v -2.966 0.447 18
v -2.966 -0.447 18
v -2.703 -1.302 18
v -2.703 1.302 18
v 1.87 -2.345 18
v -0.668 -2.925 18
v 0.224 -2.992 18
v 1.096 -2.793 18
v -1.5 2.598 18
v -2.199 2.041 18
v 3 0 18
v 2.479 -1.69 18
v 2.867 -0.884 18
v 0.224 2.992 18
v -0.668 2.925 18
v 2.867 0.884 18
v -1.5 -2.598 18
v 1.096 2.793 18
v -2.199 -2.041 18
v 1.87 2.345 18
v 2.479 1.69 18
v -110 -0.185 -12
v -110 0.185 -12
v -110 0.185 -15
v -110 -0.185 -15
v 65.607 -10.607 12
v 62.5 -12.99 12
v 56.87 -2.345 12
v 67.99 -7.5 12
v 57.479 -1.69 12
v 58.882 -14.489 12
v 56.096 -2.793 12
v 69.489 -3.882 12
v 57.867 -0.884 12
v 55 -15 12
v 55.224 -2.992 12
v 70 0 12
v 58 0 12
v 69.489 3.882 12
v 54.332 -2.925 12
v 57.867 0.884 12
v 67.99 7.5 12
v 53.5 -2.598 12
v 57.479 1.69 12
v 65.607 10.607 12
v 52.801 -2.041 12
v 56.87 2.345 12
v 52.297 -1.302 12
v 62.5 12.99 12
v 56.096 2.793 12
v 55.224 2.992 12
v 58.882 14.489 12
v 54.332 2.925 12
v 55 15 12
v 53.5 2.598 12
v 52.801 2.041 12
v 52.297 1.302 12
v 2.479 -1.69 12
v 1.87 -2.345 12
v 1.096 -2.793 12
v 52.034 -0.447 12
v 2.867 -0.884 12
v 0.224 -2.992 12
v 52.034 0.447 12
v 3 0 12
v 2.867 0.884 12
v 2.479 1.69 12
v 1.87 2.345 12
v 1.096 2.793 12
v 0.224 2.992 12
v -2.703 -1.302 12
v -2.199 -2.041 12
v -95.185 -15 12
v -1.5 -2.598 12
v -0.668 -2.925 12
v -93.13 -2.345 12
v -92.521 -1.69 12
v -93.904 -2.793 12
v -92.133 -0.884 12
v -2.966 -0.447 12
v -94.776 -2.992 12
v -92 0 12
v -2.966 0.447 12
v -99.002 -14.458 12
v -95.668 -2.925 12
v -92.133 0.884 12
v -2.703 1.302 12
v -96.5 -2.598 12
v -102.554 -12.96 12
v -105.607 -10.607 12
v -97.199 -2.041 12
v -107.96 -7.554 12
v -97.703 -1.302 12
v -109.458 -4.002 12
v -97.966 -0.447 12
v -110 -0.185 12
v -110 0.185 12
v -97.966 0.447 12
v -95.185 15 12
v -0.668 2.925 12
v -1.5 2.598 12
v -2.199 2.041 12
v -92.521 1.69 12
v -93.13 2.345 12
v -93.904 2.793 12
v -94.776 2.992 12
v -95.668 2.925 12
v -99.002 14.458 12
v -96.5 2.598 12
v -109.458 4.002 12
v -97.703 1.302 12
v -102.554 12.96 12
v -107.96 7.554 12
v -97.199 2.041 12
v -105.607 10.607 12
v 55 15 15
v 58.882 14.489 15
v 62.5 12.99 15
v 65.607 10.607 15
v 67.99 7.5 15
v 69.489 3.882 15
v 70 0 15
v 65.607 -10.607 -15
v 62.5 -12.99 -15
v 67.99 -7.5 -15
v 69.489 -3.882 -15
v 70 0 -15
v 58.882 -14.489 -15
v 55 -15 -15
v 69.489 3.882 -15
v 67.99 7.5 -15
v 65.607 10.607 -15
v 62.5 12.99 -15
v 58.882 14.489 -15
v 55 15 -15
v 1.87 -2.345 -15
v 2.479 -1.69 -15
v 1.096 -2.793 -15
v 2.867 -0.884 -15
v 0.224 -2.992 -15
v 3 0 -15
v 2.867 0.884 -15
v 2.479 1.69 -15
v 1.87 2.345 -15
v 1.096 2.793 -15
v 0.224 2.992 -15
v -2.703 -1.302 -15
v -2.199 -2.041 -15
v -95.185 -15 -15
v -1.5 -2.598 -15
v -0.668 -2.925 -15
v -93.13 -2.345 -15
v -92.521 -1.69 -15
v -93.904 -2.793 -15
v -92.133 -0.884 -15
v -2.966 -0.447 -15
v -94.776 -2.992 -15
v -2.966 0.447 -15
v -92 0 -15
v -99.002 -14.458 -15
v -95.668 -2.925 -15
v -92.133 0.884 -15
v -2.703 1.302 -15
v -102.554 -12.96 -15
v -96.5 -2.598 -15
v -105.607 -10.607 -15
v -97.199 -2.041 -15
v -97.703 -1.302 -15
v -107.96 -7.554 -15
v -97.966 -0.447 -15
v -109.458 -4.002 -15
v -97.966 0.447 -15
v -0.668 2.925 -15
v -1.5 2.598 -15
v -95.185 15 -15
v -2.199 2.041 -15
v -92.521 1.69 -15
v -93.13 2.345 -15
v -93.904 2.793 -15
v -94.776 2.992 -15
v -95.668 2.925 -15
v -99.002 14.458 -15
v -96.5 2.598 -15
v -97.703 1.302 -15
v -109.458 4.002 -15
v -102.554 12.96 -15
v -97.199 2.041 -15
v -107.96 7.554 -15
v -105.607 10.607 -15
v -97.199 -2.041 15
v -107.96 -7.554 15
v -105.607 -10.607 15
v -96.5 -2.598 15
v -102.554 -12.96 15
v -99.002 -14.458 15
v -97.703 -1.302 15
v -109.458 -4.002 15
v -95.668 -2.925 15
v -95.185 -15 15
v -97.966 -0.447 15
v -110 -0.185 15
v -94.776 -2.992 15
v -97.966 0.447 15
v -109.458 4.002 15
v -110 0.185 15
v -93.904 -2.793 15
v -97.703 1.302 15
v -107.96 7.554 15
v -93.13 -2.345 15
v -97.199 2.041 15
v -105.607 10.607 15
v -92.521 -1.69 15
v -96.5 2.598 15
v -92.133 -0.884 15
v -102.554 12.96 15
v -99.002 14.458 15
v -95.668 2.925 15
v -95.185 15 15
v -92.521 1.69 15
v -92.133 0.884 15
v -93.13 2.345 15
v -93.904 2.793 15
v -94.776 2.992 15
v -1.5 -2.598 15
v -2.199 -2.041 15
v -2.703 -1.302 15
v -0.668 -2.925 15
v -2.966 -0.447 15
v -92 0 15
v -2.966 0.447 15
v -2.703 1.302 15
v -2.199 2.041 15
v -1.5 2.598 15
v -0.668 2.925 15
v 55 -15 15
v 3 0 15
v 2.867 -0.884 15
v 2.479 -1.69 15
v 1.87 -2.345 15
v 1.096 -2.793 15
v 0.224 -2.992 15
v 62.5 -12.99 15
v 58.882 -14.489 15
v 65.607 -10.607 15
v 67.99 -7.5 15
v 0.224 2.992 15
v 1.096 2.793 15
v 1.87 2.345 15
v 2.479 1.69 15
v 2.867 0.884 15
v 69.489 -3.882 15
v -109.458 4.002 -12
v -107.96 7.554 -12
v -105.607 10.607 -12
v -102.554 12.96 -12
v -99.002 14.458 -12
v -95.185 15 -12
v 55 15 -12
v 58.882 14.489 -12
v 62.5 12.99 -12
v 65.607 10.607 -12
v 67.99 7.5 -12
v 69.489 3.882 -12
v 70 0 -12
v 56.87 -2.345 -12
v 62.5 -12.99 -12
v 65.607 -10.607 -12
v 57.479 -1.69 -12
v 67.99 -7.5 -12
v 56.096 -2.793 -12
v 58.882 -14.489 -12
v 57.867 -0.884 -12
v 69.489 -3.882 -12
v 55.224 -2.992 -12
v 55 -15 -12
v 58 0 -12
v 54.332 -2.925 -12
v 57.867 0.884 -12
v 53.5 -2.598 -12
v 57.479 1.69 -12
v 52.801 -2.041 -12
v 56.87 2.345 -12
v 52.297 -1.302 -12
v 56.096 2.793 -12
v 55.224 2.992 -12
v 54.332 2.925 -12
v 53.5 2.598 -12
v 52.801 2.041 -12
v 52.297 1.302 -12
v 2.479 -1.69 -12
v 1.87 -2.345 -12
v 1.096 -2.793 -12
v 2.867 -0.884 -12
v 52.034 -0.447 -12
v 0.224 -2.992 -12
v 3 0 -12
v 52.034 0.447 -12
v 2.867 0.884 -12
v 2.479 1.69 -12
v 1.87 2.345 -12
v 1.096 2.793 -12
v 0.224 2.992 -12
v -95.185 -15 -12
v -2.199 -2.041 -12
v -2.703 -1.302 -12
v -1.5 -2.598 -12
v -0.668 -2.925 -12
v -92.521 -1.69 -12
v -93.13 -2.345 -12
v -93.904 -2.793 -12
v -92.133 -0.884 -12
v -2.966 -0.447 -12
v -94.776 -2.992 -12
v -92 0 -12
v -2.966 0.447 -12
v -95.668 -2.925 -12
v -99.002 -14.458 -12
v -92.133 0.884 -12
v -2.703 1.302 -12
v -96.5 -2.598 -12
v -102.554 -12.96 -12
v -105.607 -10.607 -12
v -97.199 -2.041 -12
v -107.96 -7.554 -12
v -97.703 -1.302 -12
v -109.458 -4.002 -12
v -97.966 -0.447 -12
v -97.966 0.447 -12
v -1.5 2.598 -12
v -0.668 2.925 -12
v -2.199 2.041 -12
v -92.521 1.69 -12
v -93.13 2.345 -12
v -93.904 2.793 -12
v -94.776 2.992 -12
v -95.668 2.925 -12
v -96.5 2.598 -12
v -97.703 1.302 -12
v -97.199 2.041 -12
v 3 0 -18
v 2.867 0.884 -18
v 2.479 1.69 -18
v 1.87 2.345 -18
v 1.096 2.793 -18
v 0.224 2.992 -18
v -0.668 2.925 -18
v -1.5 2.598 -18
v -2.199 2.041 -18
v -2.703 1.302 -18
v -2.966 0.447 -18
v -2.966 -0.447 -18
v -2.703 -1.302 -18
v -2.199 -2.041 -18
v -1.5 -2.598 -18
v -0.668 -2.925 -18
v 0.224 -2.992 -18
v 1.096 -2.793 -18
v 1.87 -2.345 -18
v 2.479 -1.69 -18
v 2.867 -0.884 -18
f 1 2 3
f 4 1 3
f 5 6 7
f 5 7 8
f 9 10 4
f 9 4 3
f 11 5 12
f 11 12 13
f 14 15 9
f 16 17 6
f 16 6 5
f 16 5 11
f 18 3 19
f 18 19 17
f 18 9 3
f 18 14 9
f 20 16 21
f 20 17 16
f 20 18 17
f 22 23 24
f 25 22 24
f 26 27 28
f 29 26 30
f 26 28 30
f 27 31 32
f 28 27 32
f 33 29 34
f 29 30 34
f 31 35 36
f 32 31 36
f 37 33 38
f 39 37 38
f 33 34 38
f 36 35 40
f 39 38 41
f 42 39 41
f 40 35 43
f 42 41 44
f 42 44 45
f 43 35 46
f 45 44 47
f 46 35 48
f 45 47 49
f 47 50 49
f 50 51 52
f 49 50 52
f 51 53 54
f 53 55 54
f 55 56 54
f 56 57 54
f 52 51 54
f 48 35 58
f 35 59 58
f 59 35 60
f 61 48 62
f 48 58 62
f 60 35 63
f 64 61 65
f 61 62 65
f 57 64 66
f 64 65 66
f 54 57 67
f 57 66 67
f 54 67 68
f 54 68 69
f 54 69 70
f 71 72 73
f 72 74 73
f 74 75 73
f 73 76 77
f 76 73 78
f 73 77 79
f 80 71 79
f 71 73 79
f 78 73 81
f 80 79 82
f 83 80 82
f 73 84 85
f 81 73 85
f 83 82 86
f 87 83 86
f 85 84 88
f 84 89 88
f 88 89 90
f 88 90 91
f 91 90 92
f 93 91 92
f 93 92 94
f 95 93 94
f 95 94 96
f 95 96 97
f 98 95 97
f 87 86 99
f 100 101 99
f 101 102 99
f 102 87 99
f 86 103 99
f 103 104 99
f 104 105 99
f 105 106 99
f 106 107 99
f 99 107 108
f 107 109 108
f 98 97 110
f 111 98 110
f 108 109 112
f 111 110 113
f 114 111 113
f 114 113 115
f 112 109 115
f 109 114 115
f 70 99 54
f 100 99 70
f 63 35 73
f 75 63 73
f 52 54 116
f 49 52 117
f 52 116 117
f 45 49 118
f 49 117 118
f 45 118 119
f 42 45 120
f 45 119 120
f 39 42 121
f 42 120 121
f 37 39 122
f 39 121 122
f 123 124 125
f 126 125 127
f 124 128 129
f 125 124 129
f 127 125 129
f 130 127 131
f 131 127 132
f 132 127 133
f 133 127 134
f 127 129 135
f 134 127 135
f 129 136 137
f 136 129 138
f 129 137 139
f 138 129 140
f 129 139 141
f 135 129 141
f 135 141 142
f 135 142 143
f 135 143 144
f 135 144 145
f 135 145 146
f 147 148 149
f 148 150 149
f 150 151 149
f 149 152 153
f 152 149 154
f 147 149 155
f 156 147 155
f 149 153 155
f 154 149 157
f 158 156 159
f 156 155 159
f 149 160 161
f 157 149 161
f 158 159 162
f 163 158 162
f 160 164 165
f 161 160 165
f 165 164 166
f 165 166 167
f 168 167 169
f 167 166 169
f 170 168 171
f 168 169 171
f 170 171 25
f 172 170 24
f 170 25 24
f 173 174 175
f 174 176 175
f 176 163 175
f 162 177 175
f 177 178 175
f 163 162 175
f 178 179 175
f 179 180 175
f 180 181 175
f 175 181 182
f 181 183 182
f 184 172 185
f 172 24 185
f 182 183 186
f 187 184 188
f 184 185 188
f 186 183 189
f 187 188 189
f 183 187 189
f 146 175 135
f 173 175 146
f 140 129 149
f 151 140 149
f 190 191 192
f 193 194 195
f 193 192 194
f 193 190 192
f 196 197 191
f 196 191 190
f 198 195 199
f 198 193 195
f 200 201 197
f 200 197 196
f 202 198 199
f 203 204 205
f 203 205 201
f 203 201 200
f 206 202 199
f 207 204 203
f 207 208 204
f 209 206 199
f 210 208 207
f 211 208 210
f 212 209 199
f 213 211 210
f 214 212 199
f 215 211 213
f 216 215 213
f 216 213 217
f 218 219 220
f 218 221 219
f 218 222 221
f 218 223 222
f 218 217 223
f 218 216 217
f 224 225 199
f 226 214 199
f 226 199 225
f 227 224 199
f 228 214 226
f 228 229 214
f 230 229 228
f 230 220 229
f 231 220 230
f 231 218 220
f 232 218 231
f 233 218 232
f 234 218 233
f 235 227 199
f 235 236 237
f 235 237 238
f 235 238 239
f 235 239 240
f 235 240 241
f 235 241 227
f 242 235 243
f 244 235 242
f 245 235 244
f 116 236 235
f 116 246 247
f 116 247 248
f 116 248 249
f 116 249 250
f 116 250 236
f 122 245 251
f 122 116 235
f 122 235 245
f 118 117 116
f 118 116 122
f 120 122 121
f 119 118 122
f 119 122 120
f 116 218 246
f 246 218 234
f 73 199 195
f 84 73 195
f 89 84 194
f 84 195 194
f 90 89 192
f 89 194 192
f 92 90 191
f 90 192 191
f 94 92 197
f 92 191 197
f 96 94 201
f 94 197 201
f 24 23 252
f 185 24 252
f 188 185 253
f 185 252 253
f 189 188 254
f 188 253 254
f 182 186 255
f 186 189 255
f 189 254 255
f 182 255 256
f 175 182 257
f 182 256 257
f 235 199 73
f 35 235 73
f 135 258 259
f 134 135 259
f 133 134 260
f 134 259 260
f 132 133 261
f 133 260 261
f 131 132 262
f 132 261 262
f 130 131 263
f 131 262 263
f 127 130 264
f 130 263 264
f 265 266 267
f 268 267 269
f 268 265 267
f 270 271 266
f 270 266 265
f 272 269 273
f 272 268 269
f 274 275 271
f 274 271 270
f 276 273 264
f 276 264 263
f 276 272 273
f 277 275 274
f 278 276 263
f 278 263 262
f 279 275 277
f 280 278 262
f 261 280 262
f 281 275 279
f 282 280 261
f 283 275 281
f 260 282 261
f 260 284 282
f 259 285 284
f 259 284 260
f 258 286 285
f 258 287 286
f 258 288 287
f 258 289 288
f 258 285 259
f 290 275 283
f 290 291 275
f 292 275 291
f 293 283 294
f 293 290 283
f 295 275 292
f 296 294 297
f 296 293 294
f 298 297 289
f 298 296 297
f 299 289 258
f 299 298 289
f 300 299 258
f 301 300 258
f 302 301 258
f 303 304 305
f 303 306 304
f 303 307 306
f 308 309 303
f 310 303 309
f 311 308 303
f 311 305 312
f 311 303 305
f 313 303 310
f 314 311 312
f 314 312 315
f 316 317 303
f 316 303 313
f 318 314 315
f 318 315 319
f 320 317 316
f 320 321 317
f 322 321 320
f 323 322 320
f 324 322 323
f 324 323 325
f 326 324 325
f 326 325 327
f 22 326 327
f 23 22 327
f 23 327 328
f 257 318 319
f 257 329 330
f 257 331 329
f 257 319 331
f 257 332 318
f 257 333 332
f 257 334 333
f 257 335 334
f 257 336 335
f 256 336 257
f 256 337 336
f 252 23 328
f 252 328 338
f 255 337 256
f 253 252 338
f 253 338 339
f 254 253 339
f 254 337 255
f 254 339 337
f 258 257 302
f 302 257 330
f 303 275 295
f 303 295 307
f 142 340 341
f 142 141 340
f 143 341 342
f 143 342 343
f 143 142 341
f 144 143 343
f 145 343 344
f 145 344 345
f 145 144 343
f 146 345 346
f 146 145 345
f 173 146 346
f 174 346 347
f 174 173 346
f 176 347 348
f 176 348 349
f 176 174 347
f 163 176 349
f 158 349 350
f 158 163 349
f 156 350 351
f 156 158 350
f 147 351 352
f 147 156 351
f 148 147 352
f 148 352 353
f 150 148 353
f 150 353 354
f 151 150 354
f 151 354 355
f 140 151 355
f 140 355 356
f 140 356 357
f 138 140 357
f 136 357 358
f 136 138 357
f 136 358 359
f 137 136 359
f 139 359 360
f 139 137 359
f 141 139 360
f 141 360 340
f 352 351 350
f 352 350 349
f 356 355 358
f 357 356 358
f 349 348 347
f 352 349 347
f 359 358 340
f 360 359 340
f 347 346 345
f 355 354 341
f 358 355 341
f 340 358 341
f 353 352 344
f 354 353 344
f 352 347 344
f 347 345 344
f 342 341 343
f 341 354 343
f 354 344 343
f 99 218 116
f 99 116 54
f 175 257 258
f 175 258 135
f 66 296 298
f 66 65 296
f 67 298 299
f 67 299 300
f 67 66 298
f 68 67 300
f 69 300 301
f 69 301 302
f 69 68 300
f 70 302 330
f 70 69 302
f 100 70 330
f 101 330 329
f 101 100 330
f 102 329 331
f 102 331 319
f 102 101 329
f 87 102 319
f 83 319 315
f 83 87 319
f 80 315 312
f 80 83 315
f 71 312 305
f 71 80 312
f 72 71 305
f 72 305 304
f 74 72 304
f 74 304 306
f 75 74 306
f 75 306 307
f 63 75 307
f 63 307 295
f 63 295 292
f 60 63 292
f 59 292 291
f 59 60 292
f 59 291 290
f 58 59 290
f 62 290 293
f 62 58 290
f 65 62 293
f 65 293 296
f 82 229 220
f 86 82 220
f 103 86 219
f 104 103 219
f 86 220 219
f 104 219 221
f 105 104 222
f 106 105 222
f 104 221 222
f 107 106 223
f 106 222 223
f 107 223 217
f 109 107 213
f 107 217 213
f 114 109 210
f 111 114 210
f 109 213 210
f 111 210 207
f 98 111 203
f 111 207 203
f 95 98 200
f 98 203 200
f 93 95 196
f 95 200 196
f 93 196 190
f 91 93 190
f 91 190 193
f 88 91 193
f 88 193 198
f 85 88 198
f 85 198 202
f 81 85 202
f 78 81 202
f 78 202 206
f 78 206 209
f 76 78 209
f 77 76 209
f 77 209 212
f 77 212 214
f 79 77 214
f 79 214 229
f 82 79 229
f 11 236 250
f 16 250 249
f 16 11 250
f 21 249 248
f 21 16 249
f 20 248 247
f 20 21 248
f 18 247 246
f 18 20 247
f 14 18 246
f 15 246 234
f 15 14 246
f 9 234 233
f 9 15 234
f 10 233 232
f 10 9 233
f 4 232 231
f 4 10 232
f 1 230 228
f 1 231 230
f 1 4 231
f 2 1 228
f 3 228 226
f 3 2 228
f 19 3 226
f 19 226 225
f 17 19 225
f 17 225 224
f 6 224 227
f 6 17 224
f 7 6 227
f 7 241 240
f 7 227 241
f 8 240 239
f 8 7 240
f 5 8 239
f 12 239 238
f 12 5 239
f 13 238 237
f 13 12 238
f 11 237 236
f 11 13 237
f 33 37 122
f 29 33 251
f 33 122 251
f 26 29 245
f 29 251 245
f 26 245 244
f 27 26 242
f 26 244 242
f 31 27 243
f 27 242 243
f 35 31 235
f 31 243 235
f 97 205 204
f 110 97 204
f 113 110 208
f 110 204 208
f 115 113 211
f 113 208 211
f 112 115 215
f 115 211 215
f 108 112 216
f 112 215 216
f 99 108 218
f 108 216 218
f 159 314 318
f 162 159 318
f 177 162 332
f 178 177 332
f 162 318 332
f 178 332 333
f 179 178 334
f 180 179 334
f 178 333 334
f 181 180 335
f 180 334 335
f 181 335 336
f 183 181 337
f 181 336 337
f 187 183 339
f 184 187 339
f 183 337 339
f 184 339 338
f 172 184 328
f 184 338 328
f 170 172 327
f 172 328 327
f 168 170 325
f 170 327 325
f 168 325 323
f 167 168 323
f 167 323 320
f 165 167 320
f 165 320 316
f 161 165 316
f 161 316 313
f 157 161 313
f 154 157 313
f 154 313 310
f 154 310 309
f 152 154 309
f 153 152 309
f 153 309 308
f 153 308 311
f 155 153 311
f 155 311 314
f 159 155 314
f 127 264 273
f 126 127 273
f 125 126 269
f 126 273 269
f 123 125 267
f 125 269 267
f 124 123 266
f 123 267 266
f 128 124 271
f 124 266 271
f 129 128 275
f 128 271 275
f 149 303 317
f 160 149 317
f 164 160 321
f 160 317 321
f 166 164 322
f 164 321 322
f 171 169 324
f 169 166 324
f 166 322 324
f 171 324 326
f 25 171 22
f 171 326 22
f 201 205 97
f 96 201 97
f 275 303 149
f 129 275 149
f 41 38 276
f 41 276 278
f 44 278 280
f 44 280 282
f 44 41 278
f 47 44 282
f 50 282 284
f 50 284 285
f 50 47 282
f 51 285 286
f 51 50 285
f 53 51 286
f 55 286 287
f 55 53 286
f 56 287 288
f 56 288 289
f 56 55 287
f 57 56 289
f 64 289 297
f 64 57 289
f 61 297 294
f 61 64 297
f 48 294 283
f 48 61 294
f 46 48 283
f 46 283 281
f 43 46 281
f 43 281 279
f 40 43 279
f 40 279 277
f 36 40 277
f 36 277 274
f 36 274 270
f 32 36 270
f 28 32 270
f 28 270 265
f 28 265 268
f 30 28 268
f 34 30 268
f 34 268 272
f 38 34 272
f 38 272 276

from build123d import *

# Parameters (mm, degrees)
CROQUIS2_R              = 3
SALIENTE_EXTRUIR1_DEPTH = 18
CROQUIS3_R              = 3
SALIENTE_EXTRUIR2_DEPTH = 18
CROQUIS4_W              = 3
CROQUIS4_H              = 30
SALIENTE_EXTRUIR3_DEPTH = 110
CROQUIS5_W              = 3
CROQUIS5_H              = 30
SALIENTE_EXTRUIR4_DEPTH = 70
CORTAR_EXTRUIR1_DEPTH   = 70
CORTAR_EXTRUIR2_DEPTH   = 70
CROQUIS8_R              = 3
CORTAR_EXTRUIR3_DEPTH   = 70
CROQUIS9_R              = 3
SALIENTE_EXTRUIR6_DEPTH = 30


with BuildPart() as part:
    # Croquis2 → Saliente-Extruir1 (new body)
    with BuildSketch(Plane.XY):
        Circle(CROQUIS2_R)
    extrude(amount=SALIENTE_EXTRUIR1_DEPTH)

    # Croquis3 → Saliente-Extruir2 (add)
    with BuildSketch(Plane.XY):
        Circle(CROQUIS3_R)
    extrude(amount=-SALIENTE_EXTRUIR2_DEPTH)

    # Croquis4 → Saliente-Extruir3 (add)
    with BuildSketch(Plane(origin=(0, 0, 0), x_dir=(0, 0, -1), z_dir=(1, 0, 0))):
        with Locations((-13.5, 0)):
            Rectangle(CROQUIS4_W, CROQUIS4_H)
        with Locations((13.5, 0)):
            Rectangle(CROQUIS4_W, CROQUIS4_H)
    extrude(amount=-SALIENTE_EXTRUIR3_DEPTH)

    # Croquis5 → Saliente-Extruir4 (add)
    with BuildSketch(Plane(origin=(0, 0, 0), x_dir=(0, 0, -1), z_dir=(1, 0, 0))):
        with Locations((-13.5, 0)):
            Rectangle(CROQUIS5_W, CROQUIS5_H)
        with Locations((13.5, 0)):
            Rectangle(CROQUIS5_W, CROQUIS5_H)
    extrude(amount=SALIENTE_EXTRUIR4_DEPTH)

    # Croquis6 → Cortar-Extruir1 (cut)
    with BuildSketch(Plane.XY.offset(15)):
        with BuildLine():
            Line((-110, -0.185040896), (-110, -15))
            Line((-110, -15), (-95.185040896, -15))
            ThreePointArc((-95.185040896, -15), (-105.607408735, -10.607408735), (-110, -0.185040896))
        make_face()
        with BuildLine():
            Line((-110, 15), (-110, 0.185040896))
            ThreePointArc((-110, 0.185040896), (-105.607408735, 10.607408735), (-95.185040896, 15))
            Line((-95.185040896, 15), (-110, 15))
        make_face()
    extrude(amount=-CORTAR_EXTRUIR1_DEPTH, mode=Mode.SUBTRACT)

    # Croquis7 → Cortar-Extruir2 (cut)
    with BuildSketch(Plane.XY.offset(15)):
        with BuildLine():
            ThreePointArc((55, 15), (65.606601718, 10.606601718), (70, 0))
            Line((70, 0), (70, 15))
            Line((70, 15), (55, 15))
        make_face()
        with BuildLine():
            ThreePointArc((70, 0), (65.606601718, -10.606601718), (55, -15))
            Line((55, -15), (70, -15))
            Line((70, -15), (70, 0))
        make_face()
    extrude(amount=-CORTAR_EXTRUIR2_DEPTH, mode=Mode.SUBTRACT)

    # Croquis8 → Cortar-Extruir3 (cut)
    with BuildSketch(Plane.XY.offset(15)):
        with Locations((-95, 0)):
            Circle(CROQUIS8_R)
    extrude(amount=-CORTAR_EXTRUIR3_DEPTH, mode=Mode.SUBTRACT)

    # Croquis9 → Saliente-Extruir6 (add)
    with BuildSketch(Plane.XY.offset(15)):
        with Locations((55, 0)):
            Circle(CROQUIS9_R)
    extrude(amount=-SALIENTE_EXTRUIR6_DEPTH)


solid = part.part
